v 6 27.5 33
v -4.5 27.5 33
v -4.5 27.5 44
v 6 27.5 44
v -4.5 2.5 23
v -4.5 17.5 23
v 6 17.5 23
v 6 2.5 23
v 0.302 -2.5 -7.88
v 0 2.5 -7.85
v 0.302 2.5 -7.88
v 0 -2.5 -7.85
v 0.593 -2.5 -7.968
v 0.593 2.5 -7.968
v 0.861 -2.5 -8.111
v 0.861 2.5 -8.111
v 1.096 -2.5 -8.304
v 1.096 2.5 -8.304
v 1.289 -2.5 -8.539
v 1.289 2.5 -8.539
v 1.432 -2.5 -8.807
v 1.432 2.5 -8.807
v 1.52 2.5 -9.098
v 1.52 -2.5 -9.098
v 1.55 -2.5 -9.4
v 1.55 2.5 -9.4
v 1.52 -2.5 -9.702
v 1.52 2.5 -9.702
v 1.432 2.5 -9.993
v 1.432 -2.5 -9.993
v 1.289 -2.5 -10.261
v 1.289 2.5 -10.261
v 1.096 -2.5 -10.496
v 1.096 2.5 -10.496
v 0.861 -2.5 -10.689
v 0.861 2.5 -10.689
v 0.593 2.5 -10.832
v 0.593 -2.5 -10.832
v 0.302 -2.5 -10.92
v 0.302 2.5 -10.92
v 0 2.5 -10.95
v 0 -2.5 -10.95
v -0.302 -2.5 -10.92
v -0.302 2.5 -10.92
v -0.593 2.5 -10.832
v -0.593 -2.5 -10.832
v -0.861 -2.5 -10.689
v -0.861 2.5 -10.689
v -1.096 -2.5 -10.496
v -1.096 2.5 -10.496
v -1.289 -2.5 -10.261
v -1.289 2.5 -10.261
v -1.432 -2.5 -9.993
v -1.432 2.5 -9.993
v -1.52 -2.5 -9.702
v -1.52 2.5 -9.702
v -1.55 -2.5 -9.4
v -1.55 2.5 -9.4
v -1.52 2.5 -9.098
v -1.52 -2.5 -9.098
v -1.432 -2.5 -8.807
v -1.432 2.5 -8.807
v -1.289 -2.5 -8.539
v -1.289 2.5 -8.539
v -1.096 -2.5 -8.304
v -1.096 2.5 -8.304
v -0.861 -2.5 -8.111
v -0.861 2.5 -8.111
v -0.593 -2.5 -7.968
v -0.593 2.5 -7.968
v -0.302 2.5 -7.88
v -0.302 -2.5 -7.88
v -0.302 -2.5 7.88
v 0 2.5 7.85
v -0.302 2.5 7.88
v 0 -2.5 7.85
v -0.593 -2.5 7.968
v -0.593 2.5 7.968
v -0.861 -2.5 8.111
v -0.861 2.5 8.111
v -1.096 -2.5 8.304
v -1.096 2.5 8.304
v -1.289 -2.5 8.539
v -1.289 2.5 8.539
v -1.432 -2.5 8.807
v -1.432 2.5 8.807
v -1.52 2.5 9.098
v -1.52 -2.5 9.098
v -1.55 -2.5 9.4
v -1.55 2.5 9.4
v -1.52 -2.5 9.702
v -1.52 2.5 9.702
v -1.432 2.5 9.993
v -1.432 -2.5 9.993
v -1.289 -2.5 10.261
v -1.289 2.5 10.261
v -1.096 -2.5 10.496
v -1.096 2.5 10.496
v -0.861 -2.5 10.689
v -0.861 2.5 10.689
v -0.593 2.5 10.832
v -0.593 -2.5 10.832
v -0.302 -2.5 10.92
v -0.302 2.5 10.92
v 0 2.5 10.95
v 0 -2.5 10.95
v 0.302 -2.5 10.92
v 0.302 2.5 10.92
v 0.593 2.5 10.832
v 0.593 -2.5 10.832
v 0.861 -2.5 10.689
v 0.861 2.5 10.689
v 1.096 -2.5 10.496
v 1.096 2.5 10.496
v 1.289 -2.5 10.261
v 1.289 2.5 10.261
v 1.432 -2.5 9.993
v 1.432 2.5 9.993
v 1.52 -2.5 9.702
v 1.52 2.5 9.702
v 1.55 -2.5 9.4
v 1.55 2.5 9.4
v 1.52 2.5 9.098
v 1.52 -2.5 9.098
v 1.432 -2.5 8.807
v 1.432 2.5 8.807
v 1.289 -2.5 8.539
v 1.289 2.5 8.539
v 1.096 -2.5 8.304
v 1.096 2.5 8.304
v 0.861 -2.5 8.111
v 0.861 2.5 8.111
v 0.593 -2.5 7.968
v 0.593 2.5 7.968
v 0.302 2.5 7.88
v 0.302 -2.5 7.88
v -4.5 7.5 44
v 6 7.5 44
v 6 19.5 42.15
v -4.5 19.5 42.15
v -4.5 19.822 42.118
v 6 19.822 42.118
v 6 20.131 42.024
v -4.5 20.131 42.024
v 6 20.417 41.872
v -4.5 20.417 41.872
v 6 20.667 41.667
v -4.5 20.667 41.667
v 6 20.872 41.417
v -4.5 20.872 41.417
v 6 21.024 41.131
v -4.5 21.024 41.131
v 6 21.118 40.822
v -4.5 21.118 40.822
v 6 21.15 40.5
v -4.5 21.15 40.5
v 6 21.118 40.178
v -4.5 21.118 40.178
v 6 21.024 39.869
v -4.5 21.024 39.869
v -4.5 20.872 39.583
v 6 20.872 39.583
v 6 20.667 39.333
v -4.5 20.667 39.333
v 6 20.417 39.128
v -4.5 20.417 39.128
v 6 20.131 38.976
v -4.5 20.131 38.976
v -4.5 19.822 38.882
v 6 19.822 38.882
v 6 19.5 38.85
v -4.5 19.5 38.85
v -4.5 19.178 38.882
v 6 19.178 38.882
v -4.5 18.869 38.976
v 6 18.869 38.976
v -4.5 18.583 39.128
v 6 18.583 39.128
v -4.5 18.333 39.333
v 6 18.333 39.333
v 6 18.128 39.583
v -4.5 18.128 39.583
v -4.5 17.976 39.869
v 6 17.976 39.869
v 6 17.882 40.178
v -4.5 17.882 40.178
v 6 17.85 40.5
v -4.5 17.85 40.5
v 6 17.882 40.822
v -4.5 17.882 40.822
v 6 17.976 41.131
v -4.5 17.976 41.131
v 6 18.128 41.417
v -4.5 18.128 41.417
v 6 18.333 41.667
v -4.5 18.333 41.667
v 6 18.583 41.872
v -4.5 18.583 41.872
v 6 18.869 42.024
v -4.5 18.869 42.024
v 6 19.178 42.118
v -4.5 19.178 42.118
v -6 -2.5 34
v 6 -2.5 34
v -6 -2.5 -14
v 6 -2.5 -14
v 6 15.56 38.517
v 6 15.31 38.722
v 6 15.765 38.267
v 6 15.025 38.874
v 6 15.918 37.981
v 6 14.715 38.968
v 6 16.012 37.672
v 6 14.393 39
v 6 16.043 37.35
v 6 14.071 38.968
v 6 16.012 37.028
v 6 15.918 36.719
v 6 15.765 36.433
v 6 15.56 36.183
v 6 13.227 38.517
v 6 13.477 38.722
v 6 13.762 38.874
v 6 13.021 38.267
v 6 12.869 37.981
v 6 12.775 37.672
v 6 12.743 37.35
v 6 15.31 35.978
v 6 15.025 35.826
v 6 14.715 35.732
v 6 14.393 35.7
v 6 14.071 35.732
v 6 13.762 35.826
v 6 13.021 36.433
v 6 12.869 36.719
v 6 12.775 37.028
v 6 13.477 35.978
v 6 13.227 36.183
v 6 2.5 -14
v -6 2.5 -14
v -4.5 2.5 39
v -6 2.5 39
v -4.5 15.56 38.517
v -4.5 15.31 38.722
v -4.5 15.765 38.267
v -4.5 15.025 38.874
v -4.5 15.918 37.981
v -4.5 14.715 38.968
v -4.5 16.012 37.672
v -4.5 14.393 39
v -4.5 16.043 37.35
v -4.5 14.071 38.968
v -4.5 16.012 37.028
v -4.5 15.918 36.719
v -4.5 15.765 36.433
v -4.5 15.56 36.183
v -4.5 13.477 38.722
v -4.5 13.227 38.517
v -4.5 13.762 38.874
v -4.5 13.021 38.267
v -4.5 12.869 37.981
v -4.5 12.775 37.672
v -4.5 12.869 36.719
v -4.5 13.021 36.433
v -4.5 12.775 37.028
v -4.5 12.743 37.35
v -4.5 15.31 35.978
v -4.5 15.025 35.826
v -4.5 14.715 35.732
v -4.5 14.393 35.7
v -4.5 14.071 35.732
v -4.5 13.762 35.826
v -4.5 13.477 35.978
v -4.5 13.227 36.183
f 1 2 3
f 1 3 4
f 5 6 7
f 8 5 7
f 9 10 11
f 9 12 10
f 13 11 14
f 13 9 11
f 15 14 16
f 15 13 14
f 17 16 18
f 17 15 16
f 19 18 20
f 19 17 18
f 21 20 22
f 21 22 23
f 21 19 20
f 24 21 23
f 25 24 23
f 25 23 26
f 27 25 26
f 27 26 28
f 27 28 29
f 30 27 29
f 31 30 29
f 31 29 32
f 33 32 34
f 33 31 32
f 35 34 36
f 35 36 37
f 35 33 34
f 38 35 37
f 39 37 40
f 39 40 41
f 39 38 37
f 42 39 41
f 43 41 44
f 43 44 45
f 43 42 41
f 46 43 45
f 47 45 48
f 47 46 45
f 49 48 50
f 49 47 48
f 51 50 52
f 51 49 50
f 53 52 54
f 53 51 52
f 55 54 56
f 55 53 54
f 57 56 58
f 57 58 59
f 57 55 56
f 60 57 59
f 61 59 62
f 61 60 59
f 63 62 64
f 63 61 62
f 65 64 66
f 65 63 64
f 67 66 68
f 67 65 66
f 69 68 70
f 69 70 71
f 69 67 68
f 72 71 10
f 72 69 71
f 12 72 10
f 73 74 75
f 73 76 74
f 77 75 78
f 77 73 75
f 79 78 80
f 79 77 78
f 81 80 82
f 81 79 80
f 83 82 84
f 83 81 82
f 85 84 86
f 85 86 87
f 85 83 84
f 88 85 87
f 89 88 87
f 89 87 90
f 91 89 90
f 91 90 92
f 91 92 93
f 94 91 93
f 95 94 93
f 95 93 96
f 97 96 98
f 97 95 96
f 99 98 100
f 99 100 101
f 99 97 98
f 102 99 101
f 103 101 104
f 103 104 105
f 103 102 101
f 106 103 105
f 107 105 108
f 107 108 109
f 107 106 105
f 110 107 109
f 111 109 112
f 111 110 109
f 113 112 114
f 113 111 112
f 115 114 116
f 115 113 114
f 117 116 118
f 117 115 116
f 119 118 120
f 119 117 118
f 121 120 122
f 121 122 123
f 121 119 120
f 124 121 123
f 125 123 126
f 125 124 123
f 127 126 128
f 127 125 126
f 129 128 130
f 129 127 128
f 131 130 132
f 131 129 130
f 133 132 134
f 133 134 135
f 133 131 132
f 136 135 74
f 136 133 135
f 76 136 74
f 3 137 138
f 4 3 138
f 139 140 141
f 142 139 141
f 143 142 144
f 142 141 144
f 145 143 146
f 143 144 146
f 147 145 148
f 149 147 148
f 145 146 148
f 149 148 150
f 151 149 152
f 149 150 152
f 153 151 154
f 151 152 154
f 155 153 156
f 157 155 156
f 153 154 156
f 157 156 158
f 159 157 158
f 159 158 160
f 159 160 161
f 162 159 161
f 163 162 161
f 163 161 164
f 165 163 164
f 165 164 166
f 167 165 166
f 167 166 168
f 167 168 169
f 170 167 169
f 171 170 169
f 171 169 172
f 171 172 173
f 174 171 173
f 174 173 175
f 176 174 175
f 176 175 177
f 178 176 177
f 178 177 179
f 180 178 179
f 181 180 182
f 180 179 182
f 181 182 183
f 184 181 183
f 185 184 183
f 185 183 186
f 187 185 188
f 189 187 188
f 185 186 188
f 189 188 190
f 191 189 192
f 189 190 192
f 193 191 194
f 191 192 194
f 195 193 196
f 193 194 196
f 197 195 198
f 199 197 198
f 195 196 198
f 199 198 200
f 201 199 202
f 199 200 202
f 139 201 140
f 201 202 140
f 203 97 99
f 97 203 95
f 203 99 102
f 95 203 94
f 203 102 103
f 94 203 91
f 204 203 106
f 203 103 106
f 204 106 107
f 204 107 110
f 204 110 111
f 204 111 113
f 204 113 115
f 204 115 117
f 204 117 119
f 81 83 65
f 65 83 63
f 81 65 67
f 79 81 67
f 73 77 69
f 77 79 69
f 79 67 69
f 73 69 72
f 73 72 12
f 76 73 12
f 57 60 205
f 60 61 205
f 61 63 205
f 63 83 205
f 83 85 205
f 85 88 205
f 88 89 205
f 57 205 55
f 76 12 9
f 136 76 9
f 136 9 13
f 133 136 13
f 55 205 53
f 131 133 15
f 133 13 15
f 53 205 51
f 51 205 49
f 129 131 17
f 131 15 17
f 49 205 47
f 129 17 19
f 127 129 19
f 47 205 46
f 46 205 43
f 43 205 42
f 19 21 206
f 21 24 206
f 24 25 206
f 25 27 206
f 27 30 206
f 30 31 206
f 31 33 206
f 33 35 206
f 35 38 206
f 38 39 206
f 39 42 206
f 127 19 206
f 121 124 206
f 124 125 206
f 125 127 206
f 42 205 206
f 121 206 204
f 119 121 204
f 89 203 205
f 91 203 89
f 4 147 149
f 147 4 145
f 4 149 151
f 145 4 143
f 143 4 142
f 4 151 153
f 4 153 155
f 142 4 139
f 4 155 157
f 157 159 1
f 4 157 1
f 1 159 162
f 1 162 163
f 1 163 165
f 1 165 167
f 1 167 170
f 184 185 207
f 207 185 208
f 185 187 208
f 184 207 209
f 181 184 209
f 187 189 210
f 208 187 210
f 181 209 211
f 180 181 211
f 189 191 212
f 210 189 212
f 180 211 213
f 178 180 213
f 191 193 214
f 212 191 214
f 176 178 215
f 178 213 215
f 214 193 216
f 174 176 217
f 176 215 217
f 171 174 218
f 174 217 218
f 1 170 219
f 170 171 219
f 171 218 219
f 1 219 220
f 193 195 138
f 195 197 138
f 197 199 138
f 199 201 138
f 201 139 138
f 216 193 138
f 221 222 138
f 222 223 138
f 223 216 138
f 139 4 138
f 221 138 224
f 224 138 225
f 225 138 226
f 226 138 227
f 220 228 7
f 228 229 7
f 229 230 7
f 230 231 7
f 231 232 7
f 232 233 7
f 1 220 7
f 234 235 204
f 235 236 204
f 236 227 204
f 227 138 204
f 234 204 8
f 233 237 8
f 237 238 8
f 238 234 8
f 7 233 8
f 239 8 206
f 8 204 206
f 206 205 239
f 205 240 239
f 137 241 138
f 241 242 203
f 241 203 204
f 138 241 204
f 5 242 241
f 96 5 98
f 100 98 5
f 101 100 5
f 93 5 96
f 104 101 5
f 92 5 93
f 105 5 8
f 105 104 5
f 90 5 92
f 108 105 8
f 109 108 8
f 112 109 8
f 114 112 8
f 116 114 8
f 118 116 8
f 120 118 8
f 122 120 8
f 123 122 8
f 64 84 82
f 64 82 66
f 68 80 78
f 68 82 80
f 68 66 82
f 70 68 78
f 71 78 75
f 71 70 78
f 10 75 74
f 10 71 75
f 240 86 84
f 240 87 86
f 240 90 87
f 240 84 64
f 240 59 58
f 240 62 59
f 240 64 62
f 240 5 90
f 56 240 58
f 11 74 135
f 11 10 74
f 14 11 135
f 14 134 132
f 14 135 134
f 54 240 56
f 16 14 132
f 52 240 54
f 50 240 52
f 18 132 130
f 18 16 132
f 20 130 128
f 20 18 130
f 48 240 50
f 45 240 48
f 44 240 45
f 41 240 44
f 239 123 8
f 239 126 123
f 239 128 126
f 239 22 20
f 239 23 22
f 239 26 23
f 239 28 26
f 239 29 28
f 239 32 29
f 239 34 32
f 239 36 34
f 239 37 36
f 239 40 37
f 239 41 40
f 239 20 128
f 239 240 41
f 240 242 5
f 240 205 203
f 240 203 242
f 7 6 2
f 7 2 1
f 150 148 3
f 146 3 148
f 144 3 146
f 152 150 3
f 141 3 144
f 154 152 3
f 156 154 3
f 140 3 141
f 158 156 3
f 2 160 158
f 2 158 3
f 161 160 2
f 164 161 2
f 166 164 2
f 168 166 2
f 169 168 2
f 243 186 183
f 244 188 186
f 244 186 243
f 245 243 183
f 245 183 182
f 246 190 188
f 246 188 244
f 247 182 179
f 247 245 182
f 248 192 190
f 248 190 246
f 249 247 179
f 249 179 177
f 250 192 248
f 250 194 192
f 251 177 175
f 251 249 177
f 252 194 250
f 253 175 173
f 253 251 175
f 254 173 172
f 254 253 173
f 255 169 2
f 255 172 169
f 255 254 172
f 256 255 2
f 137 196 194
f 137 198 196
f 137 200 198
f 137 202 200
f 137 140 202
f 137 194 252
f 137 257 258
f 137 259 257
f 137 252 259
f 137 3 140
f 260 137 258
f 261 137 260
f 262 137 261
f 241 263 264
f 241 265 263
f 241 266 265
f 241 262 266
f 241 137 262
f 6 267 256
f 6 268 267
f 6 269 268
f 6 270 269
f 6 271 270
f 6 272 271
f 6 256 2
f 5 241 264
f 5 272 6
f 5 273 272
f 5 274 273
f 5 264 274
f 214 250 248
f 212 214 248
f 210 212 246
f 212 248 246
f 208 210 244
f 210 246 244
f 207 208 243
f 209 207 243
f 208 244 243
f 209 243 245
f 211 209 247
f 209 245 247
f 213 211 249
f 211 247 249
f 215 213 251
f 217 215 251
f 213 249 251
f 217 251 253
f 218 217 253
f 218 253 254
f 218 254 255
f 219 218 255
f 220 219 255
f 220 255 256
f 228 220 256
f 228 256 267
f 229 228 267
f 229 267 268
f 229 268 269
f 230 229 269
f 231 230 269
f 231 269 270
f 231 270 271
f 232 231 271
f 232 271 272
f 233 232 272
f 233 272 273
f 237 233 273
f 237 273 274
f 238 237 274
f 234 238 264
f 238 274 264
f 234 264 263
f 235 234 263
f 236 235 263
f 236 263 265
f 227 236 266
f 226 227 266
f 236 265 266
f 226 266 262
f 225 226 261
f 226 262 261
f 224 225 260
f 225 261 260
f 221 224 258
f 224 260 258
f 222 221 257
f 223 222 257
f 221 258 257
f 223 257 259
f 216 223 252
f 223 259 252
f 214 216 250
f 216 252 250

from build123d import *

# Parameters (mm, degrees)
SKETCH_1_W          = 12
SKETCH_1_H          = 28
SKETCH_1_R          = 1.55
EXTRUDE_1_DEPTH     = 2.5
SKETCH_2_W          = 12
SKETCH_2_H          = 5
EXTRUDE_2_DEPTH     = 30
SKETCH_3_W          = 10.5
SKETCH_3_H          = 21
EXTRUDE_3_DEPTH     = 25
CHAMFER_1_SIZE      = 10
SKETCH_4_R          = 1.65
CUT_EXTRUDE_1_DEPTH = 25
CHAMFER_2_SIZE      = 10


with BuildPart() as part:
    # 草图1 → 凸台-拉伸1 (new, symmetric)
    with BuildSketch(Plane(origin=(0, 0, 0), x_dir=(1, 0, 0), z_dir=(0, 1, 0))):
        Rectangle(SKETCH_1_W, SKETCH_1_H)
        with Locations(Location((0, 9.4, 0), (0, 0, 270))):
            Circle(SKETCH_1_R, mode=Mode.SUBTRACT)
        with Locations(Location((0, -9.4, 0), (0, 0, 90))):
            Circle(SKETCH_1_R, mode=Mode.SUBTRACT)
    extrude(amount=EXTRUDE_1_DEPTH, both=True)

    # 草图2 → 凸台-拉伸2 (add)
    with BuildSketch(Plane.XY.offset(14)):
        Rectangle(SKETCH_2_W, SKETCH_2_H)
    extrude(amount=EXTRUDE_2_DEPTH)

    # 草图3 → 凸台-拉伸3 (add)
    with BuildSketch(Plane(origin=(0, 2.5, 0), x_dir=(1, 0, 0), z_dir=(0, 1, 0))):
        with Locations((0.75, -33.5)):
            Rectangle(SKETCH_3_W, SKETCH_3_H)
    extrude(amount=EXTRUDE_3_DEPTH)

    # 倒角1
    chamfer_1_edges = [part.edges().sort_by_distance(p)[0] for p in [
        (0.75, 27.5, 23),
    ]]
    chamfer(chamfer_1_edges, length=CHAMFER_1_SIZE)

    # 草图4 → 切除-拉伸1 (cut)
    with BuildSketch(Plane.ZY.offset(4.5)):
        with Locations((40.5, 19.5)):
            Circle(SKETCH_4_R)
        with Locations((37.35, 14.393386641)):
            Circle(SKETCH_4_R)
    extrude(amount=-CUT_EXTRUDE_1_DEPTH, mode=Mode.SUBTRACT)

    # 倒角2
    chamfer_2_edges = [part.edges().sort_by_distance(p)[0] for p in [
        (0, -2.5, 44),
    ]]
    chamfer(chamfer_2_edges, length=CHAMFER_2_SIZE)


solid = part.part
